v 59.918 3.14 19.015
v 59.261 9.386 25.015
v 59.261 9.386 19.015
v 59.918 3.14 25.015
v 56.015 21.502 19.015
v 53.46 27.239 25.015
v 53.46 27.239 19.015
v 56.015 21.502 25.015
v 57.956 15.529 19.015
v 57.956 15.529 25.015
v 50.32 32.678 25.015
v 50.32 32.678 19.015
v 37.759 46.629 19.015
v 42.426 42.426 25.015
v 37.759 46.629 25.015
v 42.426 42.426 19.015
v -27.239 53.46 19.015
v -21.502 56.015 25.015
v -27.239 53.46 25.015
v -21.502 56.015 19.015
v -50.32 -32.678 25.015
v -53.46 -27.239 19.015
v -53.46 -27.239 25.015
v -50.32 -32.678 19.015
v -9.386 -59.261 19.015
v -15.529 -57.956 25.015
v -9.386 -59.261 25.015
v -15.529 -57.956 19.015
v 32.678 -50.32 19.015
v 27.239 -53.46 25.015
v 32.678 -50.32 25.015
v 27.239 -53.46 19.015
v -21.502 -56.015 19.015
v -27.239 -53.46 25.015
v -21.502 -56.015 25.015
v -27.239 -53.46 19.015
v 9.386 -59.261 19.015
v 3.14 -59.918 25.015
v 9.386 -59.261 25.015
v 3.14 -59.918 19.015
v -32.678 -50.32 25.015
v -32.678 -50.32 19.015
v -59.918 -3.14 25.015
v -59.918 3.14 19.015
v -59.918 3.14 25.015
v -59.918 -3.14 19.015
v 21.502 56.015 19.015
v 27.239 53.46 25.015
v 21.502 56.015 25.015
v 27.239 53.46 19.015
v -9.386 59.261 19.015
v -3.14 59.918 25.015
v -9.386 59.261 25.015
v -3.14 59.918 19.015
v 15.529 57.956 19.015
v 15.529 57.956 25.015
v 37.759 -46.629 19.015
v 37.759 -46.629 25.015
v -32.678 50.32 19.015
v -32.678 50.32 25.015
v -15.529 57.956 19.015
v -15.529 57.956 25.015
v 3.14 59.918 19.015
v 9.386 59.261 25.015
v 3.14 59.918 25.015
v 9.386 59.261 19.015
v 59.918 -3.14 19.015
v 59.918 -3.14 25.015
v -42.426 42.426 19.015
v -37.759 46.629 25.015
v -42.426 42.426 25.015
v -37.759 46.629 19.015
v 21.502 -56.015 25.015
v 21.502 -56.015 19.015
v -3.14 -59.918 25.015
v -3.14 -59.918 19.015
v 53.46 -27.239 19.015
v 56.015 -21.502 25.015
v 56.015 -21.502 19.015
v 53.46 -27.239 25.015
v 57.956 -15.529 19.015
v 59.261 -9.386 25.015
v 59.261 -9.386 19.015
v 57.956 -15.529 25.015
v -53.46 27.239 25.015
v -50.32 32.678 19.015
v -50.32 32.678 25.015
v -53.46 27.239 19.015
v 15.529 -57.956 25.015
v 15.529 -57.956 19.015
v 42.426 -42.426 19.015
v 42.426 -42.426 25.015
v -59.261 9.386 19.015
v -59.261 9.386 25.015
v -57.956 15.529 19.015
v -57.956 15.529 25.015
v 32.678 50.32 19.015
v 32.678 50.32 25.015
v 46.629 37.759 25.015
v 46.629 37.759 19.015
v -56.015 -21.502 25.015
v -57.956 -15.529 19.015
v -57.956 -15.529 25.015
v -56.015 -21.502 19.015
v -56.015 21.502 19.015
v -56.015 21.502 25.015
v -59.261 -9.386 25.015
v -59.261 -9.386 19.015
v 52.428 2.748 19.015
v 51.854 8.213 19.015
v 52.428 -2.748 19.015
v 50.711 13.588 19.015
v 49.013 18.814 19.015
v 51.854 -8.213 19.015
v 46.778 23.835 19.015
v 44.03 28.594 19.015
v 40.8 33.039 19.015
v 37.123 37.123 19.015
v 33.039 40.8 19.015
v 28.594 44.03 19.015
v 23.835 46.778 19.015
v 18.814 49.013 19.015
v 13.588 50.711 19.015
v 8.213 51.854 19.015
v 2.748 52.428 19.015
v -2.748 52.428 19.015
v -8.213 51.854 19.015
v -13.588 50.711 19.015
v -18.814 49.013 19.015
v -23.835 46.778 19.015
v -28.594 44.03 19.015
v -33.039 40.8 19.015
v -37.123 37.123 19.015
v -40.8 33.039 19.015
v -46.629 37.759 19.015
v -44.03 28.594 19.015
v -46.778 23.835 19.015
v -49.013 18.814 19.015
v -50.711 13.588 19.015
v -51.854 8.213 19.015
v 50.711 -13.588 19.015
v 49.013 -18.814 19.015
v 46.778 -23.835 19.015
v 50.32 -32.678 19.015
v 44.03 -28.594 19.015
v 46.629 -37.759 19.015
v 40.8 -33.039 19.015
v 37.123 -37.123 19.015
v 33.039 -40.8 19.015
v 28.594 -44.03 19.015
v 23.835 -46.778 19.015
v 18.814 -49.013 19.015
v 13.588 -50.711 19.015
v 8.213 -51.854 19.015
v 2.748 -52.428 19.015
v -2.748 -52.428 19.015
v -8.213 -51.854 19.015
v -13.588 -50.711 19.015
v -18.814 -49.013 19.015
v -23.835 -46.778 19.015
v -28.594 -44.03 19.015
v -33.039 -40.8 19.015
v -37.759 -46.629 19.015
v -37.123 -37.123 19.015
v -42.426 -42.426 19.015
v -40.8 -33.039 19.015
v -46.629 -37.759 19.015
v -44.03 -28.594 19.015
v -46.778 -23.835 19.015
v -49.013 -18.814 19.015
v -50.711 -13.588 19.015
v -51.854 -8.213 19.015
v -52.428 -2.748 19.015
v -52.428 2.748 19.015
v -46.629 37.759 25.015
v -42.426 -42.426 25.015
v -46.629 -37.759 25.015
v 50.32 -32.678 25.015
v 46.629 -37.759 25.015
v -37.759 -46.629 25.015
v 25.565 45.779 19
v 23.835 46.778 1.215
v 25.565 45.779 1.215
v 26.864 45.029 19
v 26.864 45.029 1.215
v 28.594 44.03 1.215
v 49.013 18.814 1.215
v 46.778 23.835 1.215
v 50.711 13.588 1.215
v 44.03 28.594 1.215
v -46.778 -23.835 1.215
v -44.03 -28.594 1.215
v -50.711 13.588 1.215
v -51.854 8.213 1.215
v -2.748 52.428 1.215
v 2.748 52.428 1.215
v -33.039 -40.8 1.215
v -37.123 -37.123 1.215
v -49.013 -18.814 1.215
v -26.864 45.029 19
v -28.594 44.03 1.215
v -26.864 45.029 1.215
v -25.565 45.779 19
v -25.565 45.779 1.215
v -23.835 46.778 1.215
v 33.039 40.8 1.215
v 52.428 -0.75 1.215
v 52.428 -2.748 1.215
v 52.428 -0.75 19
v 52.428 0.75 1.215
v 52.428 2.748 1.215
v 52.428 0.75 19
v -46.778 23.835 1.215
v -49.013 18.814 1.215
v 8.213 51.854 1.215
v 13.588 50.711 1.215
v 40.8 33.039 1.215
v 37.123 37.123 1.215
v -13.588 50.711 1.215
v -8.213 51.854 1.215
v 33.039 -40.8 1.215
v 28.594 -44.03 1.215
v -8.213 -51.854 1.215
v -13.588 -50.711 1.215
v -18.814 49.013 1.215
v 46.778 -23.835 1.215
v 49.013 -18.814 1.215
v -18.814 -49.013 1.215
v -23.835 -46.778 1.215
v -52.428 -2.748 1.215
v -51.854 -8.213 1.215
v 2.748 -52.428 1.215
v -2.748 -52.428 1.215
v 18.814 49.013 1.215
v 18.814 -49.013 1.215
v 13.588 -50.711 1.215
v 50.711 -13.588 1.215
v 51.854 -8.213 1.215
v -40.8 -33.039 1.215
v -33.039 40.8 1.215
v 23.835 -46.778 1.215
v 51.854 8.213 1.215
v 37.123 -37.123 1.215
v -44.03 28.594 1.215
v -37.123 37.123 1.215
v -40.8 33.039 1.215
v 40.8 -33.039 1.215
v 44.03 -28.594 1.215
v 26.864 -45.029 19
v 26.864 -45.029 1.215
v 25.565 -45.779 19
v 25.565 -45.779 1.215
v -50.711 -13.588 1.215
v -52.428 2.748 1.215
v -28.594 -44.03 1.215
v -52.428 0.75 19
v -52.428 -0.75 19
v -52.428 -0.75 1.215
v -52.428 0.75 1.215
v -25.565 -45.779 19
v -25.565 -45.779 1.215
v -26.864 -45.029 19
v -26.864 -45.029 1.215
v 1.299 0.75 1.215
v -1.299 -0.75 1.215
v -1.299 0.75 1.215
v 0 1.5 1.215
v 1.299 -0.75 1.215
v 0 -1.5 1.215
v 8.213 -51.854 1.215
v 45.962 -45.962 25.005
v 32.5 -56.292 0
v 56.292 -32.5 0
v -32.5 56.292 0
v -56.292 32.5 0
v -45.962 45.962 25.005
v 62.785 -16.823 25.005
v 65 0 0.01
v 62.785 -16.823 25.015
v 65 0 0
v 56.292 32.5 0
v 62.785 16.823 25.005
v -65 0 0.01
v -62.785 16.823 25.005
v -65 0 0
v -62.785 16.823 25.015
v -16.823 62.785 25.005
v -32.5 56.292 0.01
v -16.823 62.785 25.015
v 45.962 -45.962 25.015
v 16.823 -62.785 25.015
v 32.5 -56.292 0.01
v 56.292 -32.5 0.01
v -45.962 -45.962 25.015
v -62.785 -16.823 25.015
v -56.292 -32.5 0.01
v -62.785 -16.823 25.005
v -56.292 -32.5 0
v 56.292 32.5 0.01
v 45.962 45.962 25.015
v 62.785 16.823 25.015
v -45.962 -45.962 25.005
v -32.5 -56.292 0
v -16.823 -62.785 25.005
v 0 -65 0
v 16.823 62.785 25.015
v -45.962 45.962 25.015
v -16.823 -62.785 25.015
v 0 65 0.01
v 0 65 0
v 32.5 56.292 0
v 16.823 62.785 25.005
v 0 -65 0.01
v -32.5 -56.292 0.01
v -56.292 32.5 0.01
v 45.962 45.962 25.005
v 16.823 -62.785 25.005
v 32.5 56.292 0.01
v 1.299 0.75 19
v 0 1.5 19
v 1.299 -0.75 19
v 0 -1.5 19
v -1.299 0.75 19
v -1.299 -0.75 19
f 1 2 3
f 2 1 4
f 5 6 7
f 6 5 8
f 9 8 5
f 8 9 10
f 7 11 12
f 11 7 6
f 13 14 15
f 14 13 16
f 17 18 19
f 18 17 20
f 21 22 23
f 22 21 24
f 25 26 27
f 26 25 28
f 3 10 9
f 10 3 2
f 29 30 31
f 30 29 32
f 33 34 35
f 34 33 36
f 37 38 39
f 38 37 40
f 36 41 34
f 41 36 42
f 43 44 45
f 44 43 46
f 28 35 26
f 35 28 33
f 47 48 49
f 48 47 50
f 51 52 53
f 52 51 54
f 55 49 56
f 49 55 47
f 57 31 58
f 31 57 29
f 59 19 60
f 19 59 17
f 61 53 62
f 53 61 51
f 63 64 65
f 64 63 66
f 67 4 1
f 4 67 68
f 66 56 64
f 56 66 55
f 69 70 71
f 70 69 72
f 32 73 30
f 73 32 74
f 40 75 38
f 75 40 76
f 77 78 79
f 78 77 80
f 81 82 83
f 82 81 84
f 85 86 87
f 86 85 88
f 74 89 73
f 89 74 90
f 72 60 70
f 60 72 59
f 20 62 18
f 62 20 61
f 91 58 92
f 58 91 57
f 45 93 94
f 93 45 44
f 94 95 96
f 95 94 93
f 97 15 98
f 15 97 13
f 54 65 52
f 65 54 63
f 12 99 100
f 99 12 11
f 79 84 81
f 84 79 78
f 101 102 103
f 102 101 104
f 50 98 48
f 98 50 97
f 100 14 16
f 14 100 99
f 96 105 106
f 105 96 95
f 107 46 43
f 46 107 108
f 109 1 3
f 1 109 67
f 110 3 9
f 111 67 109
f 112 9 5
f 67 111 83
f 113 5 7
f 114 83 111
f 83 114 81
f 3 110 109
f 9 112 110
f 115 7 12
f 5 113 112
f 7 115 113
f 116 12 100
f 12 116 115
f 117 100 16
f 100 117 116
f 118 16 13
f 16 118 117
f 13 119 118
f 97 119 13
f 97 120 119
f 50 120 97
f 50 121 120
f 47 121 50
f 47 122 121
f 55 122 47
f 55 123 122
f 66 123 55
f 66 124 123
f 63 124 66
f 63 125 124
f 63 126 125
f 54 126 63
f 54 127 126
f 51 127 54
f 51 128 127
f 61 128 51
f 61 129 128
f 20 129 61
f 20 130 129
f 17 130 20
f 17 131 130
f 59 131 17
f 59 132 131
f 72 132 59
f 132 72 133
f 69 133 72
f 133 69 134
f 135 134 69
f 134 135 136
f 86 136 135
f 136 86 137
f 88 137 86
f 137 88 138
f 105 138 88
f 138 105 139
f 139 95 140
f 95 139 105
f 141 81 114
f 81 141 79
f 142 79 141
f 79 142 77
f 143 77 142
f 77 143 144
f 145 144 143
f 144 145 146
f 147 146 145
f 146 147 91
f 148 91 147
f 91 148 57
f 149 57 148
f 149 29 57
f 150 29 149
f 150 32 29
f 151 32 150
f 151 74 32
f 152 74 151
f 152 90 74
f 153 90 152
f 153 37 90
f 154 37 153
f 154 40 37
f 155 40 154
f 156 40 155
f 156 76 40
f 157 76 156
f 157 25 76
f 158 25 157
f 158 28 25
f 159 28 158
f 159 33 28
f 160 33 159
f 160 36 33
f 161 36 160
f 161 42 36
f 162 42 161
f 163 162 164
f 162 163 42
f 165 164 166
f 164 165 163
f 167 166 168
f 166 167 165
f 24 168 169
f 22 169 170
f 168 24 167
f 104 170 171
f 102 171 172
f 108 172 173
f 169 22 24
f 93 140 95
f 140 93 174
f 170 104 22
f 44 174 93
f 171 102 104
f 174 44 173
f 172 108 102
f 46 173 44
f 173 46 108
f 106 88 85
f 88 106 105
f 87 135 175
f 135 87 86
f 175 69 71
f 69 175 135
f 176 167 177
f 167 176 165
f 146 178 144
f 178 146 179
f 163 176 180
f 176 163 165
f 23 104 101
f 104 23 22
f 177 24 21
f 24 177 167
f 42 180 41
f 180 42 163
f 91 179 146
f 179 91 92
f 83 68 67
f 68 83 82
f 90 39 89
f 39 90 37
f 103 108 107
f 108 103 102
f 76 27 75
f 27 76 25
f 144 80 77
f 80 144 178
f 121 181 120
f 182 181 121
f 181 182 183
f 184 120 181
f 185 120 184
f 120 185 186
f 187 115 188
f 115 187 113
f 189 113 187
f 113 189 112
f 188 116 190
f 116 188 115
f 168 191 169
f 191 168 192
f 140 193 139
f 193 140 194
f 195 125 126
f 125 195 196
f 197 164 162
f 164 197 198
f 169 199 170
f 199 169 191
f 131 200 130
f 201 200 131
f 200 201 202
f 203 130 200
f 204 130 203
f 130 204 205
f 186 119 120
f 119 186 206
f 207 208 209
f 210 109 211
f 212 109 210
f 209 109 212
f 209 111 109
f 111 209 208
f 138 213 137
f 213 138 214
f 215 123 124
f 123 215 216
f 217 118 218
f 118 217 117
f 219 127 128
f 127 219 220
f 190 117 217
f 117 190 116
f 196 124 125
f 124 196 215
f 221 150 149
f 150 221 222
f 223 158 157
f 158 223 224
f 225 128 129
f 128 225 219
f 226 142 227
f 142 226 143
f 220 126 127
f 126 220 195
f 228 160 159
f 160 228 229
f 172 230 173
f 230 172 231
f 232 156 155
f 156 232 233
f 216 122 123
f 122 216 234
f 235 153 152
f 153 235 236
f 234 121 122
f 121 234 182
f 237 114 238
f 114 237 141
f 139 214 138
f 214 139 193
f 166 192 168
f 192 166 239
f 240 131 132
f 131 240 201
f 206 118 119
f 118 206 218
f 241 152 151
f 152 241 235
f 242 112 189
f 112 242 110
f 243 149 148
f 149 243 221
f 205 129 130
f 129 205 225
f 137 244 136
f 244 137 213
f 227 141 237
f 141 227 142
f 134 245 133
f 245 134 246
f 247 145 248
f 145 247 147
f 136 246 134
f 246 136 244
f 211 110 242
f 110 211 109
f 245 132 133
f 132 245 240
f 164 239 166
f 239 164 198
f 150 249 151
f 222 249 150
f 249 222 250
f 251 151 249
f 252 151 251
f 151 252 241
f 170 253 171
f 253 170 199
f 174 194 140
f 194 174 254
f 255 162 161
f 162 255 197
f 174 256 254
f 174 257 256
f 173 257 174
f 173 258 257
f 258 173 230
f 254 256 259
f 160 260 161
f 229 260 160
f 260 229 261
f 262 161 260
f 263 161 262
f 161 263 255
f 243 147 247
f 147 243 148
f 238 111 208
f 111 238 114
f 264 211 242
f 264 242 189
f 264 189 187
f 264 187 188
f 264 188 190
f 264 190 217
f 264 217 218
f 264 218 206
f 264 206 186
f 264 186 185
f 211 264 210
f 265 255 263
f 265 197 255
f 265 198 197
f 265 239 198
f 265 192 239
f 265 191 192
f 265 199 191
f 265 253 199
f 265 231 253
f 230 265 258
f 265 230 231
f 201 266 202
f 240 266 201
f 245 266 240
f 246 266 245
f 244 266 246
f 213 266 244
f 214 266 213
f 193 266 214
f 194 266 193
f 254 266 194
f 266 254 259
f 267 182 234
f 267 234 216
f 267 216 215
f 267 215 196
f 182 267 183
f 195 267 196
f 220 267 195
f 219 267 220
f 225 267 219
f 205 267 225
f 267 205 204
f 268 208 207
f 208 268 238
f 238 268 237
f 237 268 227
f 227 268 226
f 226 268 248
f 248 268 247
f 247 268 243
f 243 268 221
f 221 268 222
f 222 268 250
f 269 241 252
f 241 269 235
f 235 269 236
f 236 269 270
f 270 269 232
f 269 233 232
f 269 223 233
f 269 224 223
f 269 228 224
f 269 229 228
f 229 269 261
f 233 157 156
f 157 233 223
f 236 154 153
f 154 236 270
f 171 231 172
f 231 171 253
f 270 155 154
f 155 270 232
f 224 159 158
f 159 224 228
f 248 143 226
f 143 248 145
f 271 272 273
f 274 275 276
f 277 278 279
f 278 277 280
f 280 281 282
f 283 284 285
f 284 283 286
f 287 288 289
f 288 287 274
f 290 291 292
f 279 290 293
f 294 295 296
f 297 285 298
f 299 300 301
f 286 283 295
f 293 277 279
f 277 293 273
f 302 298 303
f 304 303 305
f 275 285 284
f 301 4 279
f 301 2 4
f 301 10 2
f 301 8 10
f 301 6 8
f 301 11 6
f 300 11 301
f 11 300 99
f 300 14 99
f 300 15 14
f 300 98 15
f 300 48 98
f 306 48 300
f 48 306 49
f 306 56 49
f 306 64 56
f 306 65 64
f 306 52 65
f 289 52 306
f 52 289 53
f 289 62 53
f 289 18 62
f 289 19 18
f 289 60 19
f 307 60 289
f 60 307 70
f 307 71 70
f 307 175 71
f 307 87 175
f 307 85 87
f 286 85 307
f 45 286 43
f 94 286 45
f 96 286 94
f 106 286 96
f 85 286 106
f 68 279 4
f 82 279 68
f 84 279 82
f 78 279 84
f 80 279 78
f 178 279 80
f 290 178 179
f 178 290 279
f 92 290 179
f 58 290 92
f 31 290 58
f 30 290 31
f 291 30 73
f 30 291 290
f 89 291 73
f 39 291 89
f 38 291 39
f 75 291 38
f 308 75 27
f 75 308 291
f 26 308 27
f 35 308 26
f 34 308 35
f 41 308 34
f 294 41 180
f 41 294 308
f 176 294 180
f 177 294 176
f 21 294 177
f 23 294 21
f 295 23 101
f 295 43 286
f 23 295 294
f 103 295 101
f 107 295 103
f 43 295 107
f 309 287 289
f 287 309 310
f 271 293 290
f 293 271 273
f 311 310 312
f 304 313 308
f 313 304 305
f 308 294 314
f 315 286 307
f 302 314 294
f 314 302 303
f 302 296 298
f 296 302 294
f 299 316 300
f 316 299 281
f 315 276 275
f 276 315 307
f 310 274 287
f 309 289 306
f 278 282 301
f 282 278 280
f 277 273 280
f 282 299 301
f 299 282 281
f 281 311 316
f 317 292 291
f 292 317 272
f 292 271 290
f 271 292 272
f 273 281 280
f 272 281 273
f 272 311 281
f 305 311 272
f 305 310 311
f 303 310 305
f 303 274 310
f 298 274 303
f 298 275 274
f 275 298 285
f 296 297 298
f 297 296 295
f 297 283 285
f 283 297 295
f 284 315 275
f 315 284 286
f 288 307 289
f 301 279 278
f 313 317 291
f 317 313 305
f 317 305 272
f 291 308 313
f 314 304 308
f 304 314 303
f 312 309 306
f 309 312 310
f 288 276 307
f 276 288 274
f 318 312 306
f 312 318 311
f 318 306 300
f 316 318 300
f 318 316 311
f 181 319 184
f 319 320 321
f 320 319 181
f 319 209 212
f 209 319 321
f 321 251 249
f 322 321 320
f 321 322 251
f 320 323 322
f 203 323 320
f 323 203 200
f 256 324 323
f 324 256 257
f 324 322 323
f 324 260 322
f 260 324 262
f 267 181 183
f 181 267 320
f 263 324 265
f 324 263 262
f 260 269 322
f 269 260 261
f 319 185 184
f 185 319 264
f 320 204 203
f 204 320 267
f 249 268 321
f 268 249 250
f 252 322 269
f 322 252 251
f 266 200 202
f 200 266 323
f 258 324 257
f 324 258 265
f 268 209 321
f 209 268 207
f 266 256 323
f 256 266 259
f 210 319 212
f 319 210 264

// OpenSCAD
include <../../lib/relativity.scad/relativity.scad> // https://github.com/davidson16807/relativity.scad

// print settings:
// infill 15%
// layer height: 0.3mm
// perimeters: 3
// bottom solid layers: 3

height = 25;
d_inner = 120;
edges = 12;
d_outer = d_inner + 10;

differed("cut", "not(cut)")
  hulled("hullSide")
        rod(d=d_outer, h=0.01, anchor=bottom, $class="hullSide", $fn=edges)
          translated(height*z) rotated(360/edges/2*z) rod(d=d_outer, h=0.01, anchor=bottom)
            align(top) rod(d=d_inner, h=6, anchor=top, $class="cut", $fn=60)
              align(bottom) {
                rod(d=d_inner-15, h=height-6-1.2, anchor=top);
              } 
rotated(60*z, n=[1:3]) box([d_inner, 1.5, height-6], anchor=bottom);
